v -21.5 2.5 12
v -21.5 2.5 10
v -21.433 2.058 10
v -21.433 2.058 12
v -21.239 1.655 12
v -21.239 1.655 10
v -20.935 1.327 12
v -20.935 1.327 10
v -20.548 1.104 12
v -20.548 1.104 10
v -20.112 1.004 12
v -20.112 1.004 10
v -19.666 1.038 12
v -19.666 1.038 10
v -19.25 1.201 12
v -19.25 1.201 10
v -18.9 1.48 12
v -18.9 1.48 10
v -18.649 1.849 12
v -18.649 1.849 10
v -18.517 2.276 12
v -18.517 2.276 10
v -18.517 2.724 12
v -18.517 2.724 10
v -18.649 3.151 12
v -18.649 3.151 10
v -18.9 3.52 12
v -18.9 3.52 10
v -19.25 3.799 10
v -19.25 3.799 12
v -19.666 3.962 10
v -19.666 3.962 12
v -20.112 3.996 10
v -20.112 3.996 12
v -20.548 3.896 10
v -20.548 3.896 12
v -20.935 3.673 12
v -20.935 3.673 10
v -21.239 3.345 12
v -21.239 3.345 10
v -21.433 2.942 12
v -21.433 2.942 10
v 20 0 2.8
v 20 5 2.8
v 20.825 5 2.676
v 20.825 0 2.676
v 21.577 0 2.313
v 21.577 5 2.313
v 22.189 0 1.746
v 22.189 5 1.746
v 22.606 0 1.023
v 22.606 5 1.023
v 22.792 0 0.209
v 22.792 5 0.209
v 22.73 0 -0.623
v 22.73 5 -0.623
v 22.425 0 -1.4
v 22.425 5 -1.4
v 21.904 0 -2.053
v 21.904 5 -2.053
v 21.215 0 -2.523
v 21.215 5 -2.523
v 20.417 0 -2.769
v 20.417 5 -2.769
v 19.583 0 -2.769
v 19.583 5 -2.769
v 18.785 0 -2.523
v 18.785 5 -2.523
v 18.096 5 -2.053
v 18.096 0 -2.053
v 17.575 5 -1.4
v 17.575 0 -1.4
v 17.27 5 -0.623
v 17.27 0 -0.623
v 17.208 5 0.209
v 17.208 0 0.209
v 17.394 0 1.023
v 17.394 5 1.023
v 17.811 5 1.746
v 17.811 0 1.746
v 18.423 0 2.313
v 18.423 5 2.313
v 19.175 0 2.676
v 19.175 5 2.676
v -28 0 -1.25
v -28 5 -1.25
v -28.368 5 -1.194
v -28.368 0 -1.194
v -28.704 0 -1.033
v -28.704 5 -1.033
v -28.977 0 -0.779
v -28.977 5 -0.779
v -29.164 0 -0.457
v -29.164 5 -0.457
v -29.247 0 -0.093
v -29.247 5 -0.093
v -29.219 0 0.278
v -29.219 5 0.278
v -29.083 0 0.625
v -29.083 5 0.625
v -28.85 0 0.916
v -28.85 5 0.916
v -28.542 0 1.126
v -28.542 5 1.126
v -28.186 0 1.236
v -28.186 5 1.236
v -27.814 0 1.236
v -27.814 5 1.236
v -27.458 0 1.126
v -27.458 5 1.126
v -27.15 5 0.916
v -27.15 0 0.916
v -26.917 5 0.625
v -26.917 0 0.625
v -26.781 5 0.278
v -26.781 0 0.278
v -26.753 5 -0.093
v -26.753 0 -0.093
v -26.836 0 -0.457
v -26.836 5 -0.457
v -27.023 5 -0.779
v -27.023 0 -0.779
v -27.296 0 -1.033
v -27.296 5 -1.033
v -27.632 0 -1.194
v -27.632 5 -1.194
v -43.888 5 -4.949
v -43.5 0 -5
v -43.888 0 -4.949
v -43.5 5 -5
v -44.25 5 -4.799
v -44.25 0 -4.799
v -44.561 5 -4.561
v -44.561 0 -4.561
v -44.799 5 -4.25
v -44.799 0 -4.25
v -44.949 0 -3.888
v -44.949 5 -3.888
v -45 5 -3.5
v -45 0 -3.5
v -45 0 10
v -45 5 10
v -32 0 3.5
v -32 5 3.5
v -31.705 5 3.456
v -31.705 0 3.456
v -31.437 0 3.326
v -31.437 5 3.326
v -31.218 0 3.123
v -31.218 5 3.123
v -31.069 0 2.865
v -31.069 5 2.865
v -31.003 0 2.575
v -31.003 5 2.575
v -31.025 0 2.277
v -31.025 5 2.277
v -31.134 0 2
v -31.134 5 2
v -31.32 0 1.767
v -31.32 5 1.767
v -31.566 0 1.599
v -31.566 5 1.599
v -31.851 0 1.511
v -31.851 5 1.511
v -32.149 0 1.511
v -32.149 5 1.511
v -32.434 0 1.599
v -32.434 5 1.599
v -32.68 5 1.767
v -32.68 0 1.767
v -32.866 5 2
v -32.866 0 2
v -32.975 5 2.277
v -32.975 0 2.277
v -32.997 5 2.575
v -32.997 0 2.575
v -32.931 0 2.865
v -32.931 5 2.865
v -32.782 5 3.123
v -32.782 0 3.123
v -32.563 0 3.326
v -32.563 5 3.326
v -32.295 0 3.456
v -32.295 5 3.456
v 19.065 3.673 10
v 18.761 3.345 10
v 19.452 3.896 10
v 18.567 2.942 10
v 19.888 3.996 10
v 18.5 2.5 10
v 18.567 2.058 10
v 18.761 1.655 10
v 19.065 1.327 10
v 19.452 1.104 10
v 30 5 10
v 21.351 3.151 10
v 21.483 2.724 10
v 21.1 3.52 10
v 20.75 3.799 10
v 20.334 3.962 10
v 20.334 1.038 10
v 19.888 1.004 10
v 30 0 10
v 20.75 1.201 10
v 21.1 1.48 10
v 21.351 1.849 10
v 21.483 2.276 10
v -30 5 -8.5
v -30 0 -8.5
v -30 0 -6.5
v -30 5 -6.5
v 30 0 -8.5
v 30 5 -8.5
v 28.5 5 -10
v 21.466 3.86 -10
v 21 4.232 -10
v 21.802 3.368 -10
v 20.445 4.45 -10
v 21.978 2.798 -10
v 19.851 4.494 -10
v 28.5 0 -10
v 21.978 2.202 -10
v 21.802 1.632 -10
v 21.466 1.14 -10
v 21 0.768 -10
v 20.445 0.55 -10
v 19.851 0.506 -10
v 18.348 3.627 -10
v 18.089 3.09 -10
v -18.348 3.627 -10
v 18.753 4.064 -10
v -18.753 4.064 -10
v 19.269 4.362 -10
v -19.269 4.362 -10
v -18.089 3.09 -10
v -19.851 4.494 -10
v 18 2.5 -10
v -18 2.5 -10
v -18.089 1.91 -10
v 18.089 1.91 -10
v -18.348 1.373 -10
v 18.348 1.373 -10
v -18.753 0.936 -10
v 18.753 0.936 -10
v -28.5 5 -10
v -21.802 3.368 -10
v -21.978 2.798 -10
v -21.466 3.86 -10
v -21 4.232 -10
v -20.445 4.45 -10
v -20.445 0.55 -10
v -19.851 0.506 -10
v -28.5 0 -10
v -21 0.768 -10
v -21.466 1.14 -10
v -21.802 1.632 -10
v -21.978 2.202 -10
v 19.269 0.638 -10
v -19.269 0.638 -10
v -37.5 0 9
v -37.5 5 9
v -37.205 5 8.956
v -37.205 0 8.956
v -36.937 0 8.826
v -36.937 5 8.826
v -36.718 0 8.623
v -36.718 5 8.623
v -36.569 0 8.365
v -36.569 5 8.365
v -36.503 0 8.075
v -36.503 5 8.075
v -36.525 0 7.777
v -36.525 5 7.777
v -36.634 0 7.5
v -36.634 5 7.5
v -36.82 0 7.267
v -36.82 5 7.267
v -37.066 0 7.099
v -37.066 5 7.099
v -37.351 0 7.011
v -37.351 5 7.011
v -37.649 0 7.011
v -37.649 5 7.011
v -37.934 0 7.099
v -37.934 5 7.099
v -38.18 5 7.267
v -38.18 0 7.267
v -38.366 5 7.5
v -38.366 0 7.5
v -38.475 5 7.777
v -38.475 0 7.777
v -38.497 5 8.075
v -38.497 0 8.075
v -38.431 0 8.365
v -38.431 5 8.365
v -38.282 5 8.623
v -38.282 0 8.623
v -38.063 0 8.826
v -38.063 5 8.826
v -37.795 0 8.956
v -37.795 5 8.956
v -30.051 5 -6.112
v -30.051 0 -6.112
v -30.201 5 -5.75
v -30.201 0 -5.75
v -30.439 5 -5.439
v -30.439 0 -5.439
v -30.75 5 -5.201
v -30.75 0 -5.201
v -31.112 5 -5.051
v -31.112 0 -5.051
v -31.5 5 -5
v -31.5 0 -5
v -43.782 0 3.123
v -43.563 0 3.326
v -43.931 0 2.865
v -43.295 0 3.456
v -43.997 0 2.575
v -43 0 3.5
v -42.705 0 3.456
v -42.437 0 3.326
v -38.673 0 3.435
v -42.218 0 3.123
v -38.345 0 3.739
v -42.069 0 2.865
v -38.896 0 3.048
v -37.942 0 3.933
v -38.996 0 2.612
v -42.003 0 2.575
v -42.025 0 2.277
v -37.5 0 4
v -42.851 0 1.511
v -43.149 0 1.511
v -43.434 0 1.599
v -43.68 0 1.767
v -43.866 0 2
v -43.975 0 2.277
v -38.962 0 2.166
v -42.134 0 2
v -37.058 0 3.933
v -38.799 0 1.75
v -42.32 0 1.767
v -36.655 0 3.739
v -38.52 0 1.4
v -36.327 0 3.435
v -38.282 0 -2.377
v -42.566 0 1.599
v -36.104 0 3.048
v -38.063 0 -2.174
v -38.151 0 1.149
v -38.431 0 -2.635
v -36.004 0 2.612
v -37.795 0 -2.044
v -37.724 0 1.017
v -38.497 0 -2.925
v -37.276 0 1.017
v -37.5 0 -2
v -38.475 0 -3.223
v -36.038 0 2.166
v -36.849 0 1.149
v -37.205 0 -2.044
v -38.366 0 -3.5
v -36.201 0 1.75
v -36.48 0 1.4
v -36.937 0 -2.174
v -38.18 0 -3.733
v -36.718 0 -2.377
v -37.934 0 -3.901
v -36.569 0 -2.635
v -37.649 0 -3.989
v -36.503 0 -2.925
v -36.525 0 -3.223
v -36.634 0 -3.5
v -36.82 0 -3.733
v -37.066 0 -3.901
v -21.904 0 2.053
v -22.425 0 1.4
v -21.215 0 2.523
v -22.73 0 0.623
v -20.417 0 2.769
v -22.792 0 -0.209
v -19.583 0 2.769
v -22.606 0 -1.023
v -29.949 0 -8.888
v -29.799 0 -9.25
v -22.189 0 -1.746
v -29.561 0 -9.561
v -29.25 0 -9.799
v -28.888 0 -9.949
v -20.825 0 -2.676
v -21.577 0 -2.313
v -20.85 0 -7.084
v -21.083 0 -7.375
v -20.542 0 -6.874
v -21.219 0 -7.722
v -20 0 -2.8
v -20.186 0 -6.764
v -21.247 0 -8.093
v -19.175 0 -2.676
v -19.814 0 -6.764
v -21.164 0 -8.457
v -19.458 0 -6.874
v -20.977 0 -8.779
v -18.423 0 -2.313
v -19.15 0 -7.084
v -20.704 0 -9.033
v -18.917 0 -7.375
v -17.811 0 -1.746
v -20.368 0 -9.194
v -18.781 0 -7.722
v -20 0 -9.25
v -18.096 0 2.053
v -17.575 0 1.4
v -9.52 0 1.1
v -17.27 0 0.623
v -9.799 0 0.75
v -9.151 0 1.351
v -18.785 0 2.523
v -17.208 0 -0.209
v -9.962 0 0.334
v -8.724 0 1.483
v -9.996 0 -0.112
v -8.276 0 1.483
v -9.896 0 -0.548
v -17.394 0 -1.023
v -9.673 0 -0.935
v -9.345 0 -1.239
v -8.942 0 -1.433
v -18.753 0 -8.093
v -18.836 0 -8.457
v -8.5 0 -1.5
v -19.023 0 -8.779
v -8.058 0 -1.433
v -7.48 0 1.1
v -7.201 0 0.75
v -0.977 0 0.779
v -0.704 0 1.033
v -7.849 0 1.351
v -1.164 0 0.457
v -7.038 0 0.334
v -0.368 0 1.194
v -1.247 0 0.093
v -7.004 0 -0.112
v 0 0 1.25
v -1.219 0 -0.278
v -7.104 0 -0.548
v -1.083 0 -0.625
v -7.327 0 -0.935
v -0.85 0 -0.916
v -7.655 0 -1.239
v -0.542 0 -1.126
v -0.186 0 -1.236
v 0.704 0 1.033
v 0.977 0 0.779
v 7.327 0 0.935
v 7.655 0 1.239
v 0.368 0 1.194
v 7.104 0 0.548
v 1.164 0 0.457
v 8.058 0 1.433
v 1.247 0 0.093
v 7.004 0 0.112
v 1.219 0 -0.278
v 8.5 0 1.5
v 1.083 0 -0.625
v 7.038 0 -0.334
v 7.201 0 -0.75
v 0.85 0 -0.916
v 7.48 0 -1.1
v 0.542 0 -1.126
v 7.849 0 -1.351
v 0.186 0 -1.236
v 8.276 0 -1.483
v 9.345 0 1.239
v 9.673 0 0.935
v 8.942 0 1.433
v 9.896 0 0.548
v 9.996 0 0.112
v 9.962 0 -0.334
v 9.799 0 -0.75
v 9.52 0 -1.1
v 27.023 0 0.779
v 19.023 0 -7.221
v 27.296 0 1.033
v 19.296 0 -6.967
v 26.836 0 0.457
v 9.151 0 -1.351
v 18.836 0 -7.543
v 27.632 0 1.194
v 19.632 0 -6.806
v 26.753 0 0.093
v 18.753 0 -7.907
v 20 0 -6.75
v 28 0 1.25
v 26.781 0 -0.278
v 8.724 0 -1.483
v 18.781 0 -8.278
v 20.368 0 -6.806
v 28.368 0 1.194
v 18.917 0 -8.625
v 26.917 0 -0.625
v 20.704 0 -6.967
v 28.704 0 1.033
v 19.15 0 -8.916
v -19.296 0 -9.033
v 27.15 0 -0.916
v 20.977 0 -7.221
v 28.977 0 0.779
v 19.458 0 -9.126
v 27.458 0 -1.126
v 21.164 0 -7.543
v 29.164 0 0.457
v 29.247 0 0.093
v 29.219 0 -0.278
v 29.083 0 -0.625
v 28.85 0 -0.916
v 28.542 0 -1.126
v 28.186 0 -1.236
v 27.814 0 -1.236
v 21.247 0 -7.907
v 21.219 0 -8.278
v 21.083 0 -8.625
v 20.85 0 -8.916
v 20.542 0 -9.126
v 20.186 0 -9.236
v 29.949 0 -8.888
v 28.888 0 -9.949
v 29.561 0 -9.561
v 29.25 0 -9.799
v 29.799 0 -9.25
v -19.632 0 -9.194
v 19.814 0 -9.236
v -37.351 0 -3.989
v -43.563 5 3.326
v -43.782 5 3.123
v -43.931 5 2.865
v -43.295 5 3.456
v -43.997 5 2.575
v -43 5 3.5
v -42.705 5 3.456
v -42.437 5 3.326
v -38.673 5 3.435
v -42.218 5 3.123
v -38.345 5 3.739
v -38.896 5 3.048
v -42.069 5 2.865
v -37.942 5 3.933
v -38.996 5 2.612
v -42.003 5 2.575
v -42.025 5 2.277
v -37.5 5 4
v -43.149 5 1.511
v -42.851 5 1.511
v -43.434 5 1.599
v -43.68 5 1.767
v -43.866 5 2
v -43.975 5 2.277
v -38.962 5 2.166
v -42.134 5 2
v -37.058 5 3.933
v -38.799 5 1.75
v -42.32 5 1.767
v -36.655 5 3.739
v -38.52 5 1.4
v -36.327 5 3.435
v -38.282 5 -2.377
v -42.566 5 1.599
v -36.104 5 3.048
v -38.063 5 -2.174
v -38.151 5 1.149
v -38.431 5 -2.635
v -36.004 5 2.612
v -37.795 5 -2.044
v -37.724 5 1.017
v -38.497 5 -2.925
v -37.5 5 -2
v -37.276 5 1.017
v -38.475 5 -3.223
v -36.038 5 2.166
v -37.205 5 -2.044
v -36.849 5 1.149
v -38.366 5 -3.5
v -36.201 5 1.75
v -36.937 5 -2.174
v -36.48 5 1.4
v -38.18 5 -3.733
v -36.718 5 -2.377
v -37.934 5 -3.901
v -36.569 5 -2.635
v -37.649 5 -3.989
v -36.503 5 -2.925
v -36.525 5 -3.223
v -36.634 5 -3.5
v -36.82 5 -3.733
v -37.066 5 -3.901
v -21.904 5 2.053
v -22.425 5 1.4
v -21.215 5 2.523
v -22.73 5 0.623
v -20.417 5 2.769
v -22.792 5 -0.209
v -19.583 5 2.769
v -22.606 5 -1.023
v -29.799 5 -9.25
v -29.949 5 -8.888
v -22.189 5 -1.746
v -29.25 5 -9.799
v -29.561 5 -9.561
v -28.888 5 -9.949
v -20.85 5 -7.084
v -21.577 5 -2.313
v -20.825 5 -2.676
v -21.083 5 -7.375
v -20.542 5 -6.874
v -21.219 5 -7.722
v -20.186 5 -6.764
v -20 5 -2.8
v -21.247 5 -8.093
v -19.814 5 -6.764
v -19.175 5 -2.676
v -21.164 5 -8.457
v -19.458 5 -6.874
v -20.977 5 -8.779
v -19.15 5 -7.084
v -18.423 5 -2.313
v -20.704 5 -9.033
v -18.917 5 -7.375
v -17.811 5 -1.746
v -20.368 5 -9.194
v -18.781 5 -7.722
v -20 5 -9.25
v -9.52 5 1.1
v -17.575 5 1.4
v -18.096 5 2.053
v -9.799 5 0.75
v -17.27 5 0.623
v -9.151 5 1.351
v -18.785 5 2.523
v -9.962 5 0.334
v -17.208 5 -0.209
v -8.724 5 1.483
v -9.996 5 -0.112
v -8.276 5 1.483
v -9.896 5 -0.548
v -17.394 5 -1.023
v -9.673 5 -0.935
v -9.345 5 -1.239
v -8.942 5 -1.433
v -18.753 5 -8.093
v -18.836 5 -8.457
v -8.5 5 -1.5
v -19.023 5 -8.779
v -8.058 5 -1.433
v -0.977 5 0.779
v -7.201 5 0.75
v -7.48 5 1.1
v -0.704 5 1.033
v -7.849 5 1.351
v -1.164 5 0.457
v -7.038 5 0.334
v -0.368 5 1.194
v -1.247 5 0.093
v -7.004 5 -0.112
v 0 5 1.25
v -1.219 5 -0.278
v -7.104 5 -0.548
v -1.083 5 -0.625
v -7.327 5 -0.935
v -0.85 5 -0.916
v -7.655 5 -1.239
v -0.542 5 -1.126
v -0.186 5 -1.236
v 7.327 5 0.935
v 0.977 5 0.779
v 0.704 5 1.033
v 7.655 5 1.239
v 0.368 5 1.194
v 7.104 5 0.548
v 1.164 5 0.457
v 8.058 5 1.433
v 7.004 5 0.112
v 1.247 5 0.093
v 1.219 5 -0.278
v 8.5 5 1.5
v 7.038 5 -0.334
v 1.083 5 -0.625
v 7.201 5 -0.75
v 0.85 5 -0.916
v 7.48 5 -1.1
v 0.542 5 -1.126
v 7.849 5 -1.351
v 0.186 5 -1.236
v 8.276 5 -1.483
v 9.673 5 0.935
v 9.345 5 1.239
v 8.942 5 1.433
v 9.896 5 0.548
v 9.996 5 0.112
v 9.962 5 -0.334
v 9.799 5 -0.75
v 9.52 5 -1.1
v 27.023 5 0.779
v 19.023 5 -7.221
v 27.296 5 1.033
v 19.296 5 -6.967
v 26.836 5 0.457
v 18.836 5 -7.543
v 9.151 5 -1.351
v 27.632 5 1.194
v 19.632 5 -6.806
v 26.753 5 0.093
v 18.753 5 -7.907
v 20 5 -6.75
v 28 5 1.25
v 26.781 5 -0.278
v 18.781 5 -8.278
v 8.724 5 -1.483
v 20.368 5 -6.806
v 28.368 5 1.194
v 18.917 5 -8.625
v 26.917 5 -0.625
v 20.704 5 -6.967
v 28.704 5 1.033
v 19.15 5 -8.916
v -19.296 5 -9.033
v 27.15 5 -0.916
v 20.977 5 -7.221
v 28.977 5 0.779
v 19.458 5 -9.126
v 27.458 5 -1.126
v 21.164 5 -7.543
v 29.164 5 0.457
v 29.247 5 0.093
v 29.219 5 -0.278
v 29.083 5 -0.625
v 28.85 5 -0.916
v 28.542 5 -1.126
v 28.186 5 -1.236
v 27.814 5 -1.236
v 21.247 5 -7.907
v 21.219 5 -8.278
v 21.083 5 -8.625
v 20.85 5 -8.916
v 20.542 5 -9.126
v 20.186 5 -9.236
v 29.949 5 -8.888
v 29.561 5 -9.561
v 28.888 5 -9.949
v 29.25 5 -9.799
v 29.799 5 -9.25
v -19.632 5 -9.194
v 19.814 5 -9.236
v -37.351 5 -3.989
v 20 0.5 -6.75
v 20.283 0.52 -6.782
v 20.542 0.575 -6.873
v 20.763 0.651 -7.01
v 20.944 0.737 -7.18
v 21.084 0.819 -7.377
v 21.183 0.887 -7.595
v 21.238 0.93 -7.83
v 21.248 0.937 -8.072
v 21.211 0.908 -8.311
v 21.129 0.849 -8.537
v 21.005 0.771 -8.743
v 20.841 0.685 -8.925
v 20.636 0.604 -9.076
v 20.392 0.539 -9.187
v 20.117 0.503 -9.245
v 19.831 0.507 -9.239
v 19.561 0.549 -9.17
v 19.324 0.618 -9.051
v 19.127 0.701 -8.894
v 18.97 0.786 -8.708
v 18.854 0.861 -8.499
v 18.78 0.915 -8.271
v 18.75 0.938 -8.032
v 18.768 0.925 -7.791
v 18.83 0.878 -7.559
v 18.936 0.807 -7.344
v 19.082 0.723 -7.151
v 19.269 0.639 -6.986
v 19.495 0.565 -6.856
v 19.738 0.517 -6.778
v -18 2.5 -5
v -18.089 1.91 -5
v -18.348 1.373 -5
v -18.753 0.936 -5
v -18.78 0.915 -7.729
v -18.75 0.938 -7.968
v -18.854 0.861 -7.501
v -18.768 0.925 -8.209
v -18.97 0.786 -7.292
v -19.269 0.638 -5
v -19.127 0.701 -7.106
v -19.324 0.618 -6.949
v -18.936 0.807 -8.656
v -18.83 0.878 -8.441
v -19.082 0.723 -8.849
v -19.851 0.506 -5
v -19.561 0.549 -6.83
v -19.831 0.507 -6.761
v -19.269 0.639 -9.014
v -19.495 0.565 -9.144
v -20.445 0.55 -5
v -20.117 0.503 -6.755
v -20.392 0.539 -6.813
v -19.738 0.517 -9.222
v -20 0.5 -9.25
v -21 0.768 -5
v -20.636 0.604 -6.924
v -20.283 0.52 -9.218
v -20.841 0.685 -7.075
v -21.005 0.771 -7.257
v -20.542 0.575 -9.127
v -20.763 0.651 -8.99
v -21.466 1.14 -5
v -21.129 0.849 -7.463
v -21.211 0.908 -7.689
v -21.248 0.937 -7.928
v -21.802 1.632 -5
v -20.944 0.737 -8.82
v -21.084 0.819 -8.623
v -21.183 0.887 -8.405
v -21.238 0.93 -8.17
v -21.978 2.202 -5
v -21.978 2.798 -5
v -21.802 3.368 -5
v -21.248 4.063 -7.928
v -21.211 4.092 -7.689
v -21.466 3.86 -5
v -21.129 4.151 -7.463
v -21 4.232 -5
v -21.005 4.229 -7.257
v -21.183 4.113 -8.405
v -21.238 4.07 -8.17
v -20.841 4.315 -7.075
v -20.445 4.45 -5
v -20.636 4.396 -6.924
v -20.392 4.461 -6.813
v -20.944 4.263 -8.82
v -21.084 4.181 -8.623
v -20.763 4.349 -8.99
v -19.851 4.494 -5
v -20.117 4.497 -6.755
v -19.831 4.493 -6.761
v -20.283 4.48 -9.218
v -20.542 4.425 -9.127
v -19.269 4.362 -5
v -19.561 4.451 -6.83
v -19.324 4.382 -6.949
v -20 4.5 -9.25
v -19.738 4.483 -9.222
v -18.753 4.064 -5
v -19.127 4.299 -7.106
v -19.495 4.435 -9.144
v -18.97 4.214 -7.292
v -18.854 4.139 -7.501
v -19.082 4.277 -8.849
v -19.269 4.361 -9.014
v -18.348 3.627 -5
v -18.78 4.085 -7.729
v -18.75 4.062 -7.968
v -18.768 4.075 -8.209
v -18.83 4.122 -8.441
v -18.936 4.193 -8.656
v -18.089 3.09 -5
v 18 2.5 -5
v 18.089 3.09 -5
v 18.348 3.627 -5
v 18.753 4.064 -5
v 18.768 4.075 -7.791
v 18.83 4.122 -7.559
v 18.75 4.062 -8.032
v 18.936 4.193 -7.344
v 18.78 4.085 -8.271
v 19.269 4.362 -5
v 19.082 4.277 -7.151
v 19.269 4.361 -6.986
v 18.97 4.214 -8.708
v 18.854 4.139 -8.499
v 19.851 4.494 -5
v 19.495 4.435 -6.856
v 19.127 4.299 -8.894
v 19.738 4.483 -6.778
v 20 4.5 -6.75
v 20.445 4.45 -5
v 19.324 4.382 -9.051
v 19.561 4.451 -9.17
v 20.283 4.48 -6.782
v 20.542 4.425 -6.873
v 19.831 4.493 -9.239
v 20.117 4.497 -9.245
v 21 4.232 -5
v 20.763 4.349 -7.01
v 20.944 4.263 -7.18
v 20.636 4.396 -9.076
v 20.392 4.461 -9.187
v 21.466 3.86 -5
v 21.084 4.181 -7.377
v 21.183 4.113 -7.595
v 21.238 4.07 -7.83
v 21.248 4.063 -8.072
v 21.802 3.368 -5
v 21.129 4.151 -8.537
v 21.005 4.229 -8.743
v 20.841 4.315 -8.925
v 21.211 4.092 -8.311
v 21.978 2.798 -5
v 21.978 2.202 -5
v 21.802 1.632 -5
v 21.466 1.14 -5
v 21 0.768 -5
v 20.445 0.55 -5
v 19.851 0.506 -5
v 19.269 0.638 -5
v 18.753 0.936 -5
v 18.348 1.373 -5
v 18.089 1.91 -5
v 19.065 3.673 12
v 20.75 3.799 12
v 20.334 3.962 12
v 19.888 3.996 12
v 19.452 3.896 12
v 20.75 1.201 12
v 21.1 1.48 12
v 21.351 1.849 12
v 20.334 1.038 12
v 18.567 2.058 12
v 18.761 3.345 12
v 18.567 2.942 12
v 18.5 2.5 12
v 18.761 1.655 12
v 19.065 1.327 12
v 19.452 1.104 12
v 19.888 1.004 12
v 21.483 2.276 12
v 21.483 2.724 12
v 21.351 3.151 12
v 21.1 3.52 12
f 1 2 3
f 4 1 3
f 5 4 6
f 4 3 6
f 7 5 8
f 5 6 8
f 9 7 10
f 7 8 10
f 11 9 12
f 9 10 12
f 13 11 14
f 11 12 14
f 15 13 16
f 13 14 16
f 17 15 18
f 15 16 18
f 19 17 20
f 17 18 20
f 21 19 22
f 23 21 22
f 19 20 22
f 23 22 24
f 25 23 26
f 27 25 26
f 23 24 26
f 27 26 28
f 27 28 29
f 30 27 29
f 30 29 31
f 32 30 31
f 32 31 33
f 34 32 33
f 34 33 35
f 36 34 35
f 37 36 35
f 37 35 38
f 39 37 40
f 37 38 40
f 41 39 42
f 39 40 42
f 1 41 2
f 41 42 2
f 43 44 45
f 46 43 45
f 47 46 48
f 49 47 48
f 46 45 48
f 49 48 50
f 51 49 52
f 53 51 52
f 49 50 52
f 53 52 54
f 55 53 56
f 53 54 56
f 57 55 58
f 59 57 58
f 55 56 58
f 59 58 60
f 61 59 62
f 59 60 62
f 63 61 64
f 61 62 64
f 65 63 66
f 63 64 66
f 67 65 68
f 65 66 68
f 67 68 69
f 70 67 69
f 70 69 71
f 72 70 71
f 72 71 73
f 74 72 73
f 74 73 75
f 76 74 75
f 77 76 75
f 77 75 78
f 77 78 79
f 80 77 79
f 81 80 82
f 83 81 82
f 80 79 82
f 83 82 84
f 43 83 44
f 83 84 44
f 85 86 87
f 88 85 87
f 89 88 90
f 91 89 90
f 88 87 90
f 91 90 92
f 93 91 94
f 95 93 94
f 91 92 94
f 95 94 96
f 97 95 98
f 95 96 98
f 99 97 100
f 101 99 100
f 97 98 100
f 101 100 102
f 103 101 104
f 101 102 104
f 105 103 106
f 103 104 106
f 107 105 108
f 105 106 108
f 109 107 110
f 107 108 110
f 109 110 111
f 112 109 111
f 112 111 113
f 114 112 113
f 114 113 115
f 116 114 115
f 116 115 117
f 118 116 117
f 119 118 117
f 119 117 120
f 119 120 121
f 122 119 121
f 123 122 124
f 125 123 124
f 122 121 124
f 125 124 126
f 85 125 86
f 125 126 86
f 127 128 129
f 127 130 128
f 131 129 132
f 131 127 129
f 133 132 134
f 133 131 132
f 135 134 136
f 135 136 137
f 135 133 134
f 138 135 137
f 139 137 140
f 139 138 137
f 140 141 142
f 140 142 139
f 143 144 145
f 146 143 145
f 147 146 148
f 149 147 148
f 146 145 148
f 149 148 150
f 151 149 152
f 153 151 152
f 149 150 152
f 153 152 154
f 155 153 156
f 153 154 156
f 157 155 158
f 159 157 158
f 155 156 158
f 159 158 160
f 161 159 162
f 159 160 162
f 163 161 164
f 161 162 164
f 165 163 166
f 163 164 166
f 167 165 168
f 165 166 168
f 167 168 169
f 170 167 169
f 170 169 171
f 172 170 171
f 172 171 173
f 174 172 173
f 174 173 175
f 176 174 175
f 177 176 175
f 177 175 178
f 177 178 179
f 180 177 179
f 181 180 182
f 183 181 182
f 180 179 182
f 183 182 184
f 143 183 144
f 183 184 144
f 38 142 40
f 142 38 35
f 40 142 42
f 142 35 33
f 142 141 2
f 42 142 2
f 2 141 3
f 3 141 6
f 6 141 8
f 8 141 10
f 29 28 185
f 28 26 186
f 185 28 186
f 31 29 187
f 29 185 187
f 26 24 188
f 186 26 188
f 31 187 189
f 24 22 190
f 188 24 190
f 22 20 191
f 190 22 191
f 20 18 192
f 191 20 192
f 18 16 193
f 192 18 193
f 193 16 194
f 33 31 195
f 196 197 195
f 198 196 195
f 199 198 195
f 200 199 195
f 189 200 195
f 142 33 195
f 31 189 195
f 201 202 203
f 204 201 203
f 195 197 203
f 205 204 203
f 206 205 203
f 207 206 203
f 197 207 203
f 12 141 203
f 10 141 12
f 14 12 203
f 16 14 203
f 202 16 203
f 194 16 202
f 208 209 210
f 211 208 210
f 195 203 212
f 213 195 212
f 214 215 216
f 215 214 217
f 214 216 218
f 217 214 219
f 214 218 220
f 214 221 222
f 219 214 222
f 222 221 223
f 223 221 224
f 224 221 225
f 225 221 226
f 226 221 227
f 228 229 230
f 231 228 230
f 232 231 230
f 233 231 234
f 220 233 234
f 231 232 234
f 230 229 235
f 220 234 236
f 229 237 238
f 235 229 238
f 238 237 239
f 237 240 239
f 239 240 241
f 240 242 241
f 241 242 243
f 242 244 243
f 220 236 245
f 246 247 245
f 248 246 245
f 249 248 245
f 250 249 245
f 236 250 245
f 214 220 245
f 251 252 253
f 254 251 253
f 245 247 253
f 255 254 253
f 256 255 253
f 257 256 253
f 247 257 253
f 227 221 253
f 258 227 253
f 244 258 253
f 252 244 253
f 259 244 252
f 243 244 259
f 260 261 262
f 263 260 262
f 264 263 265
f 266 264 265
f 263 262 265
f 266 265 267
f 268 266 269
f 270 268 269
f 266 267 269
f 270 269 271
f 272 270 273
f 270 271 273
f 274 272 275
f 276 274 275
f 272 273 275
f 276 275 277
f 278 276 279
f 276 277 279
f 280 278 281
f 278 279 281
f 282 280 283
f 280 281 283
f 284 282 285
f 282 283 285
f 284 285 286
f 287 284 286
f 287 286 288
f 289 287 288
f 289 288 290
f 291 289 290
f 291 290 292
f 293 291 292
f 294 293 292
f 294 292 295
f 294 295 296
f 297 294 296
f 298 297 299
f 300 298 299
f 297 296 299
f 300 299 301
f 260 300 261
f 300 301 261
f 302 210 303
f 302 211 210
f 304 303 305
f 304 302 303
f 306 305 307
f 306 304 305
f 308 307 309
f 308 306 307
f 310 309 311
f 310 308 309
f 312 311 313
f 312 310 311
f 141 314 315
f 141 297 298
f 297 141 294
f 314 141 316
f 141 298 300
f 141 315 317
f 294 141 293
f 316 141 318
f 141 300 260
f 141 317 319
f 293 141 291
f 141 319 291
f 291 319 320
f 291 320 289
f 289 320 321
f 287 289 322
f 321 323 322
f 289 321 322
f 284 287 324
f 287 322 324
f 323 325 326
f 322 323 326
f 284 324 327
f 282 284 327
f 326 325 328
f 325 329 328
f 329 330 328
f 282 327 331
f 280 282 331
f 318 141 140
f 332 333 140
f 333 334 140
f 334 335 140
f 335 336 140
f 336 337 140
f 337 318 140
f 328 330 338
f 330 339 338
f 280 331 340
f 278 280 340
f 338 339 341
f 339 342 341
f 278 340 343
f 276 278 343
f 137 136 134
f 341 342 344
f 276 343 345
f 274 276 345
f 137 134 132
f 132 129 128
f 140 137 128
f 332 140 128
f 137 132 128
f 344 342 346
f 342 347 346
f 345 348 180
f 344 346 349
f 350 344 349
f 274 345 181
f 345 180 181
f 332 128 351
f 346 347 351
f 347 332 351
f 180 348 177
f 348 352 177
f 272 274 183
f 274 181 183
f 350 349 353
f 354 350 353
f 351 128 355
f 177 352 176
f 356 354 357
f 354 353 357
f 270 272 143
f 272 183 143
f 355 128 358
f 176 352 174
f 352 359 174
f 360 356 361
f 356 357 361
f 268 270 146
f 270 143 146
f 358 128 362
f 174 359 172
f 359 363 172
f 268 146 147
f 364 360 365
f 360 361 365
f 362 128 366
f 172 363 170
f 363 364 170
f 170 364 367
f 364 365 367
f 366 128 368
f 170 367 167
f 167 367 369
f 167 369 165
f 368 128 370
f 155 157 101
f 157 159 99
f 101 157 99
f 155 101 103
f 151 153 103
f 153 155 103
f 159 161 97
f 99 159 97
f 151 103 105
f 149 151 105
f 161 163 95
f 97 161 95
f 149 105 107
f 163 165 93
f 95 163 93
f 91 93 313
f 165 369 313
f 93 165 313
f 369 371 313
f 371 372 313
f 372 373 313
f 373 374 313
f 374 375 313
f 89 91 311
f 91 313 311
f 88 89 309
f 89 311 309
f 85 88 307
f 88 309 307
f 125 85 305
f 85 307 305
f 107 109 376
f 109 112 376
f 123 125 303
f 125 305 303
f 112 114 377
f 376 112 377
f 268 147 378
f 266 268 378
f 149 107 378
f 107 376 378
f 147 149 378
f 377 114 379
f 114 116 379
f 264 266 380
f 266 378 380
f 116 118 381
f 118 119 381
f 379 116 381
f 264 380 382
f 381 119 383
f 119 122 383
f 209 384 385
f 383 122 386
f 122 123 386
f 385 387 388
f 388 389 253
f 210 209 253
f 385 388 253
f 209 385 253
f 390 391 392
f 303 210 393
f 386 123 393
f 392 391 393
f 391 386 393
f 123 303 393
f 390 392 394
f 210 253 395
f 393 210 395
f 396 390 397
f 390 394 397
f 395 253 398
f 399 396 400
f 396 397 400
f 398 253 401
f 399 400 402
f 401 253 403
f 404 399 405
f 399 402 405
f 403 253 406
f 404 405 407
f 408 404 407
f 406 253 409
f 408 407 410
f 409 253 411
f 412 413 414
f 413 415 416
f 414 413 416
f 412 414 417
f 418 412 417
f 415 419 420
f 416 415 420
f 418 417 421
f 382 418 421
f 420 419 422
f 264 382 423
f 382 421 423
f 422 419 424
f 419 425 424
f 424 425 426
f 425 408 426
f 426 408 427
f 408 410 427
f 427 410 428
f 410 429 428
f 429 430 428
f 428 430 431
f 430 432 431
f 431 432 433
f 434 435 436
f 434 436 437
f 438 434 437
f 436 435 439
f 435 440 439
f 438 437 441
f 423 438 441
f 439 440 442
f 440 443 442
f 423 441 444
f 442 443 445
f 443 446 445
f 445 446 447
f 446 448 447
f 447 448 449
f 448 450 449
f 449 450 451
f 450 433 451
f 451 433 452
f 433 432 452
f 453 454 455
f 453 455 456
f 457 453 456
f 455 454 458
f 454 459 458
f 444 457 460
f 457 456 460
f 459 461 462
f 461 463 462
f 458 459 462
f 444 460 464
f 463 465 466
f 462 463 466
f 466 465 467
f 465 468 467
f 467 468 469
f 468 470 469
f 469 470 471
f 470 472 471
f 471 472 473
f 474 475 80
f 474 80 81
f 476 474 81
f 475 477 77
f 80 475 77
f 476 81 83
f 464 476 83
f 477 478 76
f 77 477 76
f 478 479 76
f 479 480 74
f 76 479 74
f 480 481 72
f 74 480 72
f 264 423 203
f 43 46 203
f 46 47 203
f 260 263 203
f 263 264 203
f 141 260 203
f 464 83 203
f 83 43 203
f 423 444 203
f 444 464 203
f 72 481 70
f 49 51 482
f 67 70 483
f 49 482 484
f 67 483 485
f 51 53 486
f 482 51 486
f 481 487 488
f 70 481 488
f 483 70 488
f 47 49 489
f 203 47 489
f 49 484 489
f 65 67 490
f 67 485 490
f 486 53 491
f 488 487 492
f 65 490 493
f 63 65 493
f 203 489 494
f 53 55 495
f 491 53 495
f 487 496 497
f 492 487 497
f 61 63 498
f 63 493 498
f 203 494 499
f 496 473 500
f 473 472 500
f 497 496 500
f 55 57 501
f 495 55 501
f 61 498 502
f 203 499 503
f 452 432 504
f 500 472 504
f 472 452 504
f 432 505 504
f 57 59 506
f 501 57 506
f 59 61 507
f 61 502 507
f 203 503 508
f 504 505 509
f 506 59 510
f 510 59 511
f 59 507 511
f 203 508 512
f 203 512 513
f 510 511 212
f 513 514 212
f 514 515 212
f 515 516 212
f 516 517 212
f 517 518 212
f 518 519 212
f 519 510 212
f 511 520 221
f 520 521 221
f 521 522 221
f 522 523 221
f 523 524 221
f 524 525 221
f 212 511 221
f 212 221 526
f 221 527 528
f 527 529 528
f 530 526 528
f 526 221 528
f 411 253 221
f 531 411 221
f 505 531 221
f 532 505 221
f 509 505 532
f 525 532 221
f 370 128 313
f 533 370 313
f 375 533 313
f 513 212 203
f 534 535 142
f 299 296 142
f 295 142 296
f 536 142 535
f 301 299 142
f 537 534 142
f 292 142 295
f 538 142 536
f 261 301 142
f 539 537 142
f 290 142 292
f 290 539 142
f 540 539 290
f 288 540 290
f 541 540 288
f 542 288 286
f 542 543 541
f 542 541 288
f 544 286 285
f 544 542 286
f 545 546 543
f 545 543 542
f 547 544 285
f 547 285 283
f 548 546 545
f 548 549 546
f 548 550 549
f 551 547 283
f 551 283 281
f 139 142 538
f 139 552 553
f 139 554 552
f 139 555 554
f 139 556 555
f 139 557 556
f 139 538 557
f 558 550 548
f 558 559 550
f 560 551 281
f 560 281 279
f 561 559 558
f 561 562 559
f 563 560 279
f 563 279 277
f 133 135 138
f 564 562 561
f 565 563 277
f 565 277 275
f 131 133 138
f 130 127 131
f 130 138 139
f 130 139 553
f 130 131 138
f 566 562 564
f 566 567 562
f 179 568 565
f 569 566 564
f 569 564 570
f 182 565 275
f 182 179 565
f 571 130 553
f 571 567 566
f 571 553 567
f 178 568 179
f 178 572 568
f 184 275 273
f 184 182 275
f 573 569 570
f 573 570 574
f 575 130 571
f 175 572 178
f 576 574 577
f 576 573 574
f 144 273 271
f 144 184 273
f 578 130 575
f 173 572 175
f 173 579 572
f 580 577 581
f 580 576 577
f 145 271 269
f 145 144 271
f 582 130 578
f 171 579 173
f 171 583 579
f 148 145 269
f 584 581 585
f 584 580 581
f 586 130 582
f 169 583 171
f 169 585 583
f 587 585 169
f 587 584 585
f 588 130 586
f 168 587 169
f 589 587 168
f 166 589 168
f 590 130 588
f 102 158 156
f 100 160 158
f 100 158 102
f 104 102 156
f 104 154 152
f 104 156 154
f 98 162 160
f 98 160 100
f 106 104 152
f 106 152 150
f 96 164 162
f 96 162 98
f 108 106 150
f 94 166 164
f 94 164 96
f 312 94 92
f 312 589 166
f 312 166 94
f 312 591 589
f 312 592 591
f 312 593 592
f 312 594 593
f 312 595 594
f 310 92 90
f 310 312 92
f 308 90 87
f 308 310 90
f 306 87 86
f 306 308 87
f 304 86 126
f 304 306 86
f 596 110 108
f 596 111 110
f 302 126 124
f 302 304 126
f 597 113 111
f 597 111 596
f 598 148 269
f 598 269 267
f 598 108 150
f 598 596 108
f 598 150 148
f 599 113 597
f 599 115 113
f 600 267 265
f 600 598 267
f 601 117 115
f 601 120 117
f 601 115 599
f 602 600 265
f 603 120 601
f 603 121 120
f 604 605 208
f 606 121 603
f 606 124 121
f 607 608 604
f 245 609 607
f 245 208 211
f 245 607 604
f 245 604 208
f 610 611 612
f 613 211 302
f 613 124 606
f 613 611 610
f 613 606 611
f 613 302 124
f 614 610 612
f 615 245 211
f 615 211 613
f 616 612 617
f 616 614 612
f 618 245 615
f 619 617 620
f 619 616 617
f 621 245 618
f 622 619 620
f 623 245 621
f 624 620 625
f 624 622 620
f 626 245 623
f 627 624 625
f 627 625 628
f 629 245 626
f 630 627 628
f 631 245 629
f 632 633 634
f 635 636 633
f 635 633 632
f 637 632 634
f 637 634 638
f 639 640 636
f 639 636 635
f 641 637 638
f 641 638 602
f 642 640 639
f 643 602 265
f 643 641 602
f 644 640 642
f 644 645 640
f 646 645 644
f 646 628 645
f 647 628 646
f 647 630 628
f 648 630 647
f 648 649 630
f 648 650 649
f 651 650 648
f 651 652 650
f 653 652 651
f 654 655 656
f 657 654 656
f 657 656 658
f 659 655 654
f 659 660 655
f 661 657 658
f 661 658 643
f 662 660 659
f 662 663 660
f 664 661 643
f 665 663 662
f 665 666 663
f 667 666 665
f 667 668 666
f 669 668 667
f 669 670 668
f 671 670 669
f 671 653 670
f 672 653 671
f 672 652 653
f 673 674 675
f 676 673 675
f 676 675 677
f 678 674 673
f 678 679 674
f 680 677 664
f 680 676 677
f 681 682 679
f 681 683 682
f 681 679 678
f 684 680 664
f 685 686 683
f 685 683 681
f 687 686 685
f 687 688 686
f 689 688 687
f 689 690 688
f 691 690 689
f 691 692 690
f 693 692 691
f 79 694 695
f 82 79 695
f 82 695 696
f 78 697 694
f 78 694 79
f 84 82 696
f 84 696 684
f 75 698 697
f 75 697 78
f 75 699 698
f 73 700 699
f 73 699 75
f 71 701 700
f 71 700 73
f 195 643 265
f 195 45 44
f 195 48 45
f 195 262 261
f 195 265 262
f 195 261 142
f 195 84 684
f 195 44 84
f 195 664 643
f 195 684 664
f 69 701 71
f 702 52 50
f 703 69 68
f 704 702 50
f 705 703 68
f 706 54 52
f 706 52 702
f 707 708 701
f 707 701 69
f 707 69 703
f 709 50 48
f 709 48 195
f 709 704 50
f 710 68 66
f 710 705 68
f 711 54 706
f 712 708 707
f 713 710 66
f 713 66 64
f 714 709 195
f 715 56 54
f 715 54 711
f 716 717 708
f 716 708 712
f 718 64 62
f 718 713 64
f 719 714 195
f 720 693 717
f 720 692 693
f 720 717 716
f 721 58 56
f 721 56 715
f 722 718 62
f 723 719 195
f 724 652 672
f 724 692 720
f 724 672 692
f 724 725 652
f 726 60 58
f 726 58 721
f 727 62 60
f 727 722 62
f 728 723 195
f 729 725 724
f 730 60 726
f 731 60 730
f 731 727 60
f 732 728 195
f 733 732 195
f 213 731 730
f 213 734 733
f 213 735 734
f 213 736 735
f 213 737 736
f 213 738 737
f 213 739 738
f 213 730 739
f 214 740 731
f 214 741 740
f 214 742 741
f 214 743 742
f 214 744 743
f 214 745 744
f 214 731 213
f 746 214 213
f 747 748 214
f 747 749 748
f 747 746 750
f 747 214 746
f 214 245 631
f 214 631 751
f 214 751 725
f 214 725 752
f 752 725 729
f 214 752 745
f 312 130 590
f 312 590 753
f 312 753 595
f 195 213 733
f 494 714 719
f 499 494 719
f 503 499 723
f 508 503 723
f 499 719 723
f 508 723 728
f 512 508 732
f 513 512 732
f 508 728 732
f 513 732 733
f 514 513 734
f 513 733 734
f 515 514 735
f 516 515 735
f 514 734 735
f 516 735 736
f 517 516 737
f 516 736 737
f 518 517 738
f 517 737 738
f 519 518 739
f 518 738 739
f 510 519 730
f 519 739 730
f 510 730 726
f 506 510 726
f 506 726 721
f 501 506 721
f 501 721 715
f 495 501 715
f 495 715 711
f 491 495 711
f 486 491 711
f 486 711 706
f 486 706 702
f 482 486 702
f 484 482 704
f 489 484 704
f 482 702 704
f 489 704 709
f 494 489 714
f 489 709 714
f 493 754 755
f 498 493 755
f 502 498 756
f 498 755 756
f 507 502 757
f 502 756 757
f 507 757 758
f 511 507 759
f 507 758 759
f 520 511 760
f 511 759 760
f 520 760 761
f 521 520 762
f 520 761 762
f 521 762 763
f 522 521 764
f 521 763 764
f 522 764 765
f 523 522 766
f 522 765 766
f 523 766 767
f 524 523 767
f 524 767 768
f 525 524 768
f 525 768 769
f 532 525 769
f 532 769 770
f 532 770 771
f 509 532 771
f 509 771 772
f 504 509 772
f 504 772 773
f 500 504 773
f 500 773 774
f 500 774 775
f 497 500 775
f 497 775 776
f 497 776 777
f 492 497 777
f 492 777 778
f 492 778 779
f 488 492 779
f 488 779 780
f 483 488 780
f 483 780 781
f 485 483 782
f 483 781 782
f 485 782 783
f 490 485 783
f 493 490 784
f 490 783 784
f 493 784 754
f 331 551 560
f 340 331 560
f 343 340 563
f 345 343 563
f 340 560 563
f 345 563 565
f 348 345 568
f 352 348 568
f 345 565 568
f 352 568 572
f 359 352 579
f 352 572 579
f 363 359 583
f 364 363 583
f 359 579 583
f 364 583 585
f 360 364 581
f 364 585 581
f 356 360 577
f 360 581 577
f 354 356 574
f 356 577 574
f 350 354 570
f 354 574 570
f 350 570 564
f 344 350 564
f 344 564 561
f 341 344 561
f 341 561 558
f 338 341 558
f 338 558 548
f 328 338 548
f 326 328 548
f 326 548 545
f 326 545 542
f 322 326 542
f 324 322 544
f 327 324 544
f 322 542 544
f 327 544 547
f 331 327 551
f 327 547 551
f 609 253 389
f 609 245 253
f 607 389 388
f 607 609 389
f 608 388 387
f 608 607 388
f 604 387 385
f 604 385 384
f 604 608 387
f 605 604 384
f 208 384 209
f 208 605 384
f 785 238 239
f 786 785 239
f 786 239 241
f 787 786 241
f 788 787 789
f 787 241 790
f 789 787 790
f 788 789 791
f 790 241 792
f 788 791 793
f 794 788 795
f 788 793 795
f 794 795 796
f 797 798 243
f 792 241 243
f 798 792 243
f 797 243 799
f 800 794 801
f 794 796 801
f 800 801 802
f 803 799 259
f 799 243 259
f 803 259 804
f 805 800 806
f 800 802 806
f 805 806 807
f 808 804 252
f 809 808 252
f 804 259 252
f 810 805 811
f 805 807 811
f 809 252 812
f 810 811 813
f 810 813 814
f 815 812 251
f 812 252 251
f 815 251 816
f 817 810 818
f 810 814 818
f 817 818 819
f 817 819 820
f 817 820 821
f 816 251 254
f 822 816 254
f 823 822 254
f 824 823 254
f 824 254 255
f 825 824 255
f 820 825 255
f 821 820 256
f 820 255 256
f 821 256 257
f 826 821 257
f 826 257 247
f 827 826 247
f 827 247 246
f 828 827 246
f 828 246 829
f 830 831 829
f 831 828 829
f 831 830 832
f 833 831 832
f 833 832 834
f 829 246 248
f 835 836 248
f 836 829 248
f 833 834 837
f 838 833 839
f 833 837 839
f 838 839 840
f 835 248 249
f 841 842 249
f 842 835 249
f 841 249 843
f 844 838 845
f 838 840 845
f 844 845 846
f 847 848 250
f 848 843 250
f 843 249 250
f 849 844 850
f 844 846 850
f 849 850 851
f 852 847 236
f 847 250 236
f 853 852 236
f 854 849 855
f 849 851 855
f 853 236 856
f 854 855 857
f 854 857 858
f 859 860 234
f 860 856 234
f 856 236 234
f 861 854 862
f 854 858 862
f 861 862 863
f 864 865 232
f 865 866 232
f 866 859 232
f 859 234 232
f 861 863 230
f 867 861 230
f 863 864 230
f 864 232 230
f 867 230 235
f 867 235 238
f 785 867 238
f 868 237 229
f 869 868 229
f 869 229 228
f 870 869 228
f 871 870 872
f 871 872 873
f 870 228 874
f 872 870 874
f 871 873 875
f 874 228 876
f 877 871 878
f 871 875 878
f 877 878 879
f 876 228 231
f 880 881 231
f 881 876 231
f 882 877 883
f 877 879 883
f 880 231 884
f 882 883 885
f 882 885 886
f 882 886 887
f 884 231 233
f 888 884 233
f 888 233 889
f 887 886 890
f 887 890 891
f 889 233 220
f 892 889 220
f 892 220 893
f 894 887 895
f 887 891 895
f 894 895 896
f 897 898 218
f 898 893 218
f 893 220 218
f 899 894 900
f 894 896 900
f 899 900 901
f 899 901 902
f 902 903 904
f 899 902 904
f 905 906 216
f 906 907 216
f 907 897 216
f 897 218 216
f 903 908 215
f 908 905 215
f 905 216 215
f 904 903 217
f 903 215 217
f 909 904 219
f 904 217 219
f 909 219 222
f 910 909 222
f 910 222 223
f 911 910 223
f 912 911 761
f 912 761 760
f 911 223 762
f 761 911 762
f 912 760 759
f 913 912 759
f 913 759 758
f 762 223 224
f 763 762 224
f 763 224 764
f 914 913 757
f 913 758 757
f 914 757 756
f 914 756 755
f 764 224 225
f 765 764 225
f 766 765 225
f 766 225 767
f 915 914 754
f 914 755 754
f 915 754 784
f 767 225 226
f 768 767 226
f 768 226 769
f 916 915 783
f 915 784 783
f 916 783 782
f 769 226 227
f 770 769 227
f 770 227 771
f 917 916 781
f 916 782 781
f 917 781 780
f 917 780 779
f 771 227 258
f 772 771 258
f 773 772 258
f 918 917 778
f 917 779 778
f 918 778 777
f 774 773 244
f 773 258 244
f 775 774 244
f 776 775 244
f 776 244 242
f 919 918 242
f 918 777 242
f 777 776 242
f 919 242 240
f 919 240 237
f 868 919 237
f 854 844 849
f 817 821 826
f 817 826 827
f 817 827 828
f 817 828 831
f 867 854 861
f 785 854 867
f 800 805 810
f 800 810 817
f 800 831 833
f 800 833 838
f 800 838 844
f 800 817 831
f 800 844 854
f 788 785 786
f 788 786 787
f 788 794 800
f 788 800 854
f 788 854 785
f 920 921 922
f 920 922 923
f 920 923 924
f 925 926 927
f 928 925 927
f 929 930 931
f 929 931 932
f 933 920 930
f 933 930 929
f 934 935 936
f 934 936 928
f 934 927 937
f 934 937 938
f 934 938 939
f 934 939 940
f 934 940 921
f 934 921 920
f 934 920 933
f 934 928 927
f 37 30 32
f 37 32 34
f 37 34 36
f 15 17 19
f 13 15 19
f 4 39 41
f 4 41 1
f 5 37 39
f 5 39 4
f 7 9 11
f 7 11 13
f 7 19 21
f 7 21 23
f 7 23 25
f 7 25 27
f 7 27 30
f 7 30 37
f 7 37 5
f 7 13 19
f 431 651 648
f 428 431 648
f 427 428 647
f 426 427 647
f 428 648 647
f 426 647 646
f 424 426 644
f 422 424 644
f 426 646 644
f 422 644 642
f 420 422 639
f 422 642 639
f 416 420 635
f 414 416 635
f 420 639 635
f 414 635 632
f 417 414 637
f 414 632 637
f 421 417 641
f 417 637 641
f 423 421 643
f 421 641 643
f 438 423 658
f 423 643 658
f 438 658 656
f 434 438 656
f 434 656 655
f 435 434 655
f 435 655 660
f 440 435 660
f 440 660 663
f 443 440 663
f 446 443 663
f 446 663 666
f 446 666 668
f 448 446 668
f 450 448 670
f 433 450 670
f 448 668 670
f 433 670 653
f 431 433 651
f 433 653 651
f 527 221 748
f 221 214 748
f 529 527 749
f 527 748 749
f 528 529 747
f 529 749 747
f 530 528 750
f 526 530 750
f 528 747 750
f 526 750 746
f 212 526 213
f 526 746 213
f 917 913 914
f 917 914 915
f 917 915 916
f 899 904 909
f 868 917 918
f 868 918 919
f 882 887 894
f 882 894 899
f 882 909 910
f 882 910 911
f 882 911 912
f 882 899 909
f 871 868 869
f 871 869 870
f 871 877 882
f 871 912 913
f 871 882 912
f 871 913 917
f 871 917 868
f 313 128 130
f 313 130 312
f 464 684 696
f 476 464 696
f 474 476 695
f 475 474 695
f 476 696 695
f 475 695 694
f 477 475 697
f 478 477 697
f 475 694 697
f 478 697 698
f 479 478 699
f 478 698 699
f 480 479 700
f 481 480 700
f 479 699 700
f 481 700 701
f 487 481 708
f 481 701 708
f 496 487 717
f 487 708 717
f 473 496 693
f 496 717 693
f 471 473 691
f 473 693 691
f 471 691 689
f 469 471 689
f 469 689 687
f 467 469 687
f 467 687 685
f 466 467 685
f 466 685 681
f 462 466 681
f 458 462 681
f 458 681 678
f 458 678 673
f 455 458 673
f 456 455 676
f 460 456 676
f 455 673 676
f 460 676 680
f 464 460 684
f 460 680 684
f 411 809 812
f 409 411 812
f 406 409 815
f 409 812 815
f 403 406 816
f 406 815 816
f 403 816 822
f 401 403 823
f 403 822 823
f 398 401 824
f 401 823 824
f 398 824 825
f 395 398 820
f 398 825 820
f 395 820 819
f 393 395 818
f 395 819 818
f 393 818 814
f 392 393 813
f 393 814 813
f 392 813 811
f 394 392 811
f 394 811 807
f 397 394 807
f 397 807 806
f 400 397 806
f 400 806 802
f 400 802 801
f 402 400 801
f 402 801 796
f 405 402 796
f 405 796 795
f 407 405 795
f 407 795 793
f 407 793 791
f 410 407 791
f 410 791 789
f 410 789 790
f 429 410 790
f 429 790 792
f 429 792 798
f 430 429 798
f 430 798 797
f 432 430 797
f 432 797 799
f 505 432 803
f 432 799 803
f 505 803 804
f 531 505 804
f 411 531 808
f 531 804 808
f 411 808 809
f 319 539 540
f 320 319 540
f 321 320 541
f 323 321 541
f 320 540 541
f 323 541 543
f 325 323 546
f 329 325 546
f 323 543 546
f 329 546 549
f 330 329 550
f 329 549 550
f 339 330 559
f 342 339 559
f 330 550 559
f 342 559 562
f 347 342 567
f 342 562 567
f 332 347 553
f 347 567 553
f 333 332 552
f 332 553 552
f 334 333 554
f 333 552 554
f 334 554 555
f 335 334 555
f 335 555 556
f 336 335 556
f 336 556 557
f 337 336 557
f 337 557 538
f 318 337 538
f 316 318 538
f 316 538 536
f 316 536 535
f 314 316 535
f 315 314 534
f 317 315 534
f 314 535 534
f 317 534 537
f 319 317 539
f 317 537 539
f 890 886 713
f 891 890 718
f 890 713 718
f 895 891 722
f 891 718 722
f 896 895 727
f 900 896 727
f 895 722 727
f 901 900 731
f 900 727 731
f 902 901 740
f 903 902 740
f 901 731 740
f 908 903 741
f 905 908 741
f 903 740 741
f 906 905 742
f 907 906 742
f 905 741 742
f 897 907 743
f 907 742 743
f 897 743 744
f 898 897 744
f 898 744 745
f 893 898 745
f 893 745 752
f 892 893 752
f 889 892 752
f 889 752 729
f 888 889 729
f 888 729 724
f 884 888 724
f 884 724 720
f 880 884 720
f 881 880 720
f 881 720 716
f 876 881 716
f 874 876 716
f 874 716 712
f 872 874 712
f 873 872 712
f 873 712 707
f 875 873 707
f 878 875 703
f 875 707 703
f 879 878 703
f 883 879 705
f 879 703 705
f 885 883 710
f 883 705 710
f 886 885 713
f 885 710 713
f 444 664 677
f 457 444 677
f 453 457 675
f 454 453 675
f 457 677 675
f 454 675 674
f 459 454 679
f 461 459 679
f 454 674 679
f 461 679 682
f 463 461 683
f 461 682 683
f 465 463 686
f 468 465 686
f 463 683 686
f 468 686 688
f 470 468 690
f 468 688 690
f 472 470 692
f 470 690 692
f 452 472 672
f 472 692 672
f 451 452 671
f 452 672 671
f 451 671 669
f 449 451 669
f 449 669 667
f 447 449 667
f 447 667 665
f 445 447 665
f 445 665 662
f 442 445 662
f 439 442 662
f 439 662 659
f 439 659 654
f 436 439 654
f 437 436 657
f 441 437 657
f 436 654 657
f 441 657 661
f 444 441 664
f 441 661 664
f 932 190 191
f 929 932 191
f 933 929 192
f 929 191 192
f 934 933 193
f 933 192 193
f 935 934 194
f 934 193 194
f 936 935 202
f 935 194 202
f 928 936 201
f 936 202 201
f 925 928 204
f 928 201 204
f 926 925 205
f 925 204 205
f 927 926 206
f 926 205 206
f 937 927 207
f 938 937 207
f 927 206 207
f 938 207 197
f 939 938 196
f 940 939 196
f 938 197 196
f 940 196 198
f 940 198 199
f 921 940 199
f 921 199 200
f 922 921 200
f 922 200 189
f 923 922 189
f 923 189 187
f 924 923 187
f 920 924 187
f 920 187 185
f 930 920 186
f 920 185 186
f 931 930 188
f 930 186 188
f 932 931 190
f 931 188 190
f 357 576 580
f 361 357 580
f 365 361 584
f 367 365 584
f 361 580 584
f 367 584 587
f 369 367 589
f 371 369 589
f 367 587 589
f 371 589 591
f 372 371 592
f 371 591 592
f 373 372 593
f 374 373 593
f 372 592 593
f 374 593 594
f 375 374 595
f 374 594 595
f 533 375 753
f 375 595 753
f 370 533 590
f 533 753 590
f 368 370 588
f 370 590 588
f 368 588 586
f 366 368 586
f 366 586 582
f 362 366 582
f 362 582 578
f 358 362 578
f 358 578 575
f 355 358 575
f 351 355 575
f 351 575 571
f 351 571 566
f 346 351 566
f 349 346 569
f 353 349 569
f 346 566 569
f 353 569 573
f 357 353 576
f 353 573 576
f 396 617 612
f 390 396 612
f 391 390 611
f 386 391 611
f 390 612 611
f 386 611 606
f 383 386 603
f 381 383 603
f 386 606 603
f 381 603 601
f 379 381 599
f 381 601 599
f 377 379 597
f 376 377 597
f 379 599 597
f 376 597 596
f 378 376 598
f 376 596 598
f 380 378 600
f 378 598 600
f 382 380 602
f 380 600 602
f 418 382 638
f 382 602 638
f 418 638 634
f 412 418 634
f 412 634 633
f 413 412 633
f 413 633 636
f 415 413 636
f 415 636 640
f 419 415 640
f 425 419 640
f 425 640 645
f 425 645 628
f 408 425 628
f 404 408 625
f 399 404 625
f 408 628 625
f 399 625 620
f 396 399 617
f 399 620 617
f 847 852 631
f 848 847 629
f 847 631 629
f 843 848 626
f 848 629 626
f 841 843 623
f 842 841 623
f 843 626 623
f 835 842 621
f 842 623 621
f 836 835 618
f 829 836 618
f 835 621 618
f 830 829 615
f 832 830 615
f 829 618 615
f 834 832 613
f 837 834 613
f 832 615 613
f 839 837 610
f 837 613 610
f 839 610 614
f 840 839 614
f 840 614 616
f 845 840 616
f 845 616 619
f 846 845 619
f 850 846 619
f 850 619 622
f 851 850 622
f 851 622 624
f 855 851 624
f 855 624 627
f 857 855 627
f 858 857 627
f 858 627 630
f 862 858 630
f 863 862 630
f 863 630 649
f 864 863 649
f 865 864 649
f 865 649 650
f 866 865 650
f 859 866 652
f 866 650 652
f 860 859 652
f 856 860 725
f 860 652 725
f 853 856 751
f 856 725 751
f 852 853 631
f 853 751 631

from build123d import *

# Parameters (mm, degrees)
SKETCH_1_W          = 15
SKETCH_1_H          = 15
EXTRUDE_1_DEPTH     = 5
SKETCH_2_R          = 1.5
SKETCH_2_R_2        = 1.25
SKETCH_2_R_3        = 2.8
SKETCH_2_R_4        = 1
CUT_EXTRUDE_1_DEPTH = 5
FILLET_1_R          = 1.5
SKETCH_4_R          = 1.5
EXTRUDE_2_DEPTH     = 2
SKETCH_5_R          = 2
CUT_EXTRUDE_2_DEPTH = 5


with BuildPart() as part:
    # 草图1 → 凸台-拉伸1 (new body)
    with BuildSketch(Plane(origin=(0, 0, 0), x_dir=(1, 0, 0), z_dir=(0, 1, 0))):
        Polygon((30, 10), (-30, 10), (-30, 5), (-30, -10), (30, -10), align=None)
        with Locations((-37.5, -2.5)):
            Rectangle(SKETCH_1_W, SKETCH_1_H)
    extrude(amount=EXTRUDE_1_DEPTH)

    # 草图2 → 切除-拉伸1 (cut)
    with BuildSketch(Plane(origin=(0, 5, 0), x_dir=(1, 0, 0), z_dir=(0, 1, 0))):
        with Locations(Location((8.5, 0, 0), (0, 0, 270))):
            Circle(SKETCH_2_R)
        with Locations(Location((-8.5, 0, 0), (0, 0, 90))):
            Circle(SKETCH_2_R)
        with Locations(Location((0, 0, 0), (0, 0, 270))):
            Circle(SKETCH_2_R_2)
        with Locations(Location((20, 0, 0), (0, 0, 270))):
            Circle(SKETCH_2_R_3)
        with Locations(Location((-20, 0, 0), (0, 0, 90))):
            Circle(SKETCH_2_R_3)
        with Locations(Location((20, 8, 0), (0, 0, 270))):
            Circle(SKETCH_2_R_2)
        with Locations(Location((28, 0, 0), (0, 0, 270))):
            Circle(SKETCH_2_R_2)
        with Locations(Location((-28, 0, 0), (0, 0, 90))):
            Circle(SKETCH_2_R_2)
        with Locations(Location((-20, 8, 0), (0, 0, 90))):
            Circle(SKETCH_2_R_2)
        with Locations(Location((-37.5, -2.5, 0), (0, 0, 270))):
            Circle(SKETCH_2_R)
        with Locations(Location((-32, -2.5, 0), (0, 0, 270))):
            Circle(SKETCH_2_R_4)
        with Locations(Location((-37.5, -8, 0), (0, 0, 270))):
            Circle(SKETCH_2_R_4)
        with Locations(Location((-43, -2.5, 0), (0, 0, 270))):
            Circle(SKETCH_2_R_4)
        with Locations(Location((-37.5, 3, 0), (0, 0, 270))):
            Circle(SKETCH_2_R_4)
    extrude(amount=-CUT_EXTRUDE_1_DEPTH, mode=Mode.SUBTRACT)

    # 圆角1
    fillet_1_edges = [part.edges().sort_by_distance(p)[0] for p in [
        (-30, 2.5, -5),
        (-45, 2.5, -5),
        (-30, 2.5, -10),
        (30, 2.5, -10),
    ]]
    fillet(fillet_1_edges, radius=FILLET_1_R)

    # 草图4 → 凸台-拉伸2 (add)
    with BuildSketch(Plane.XY.offset(10)):
        with Locations(Location((20, 2.5, 0), (0, 0, 180))):
            Circle(SKETCH_4_R)
        with Locations(Location((-20, 2.5, 0), (0, 0, 180))):
            Circle(SKETCH_4_R)
    extrude(amount=EXTRUDE_2_DEPTH)

    # 草图5 → 切除-拉伸2 (cut)
    with BuildSketch(Plane(origin=(0, 0, -10), x_dir=(-1, 0, 0), z_dir=(0, 0, -1))):
        with Locations((-20, 2.5)):
            Circle(SKETCH_5_R)
        with Locations(Location((20, 2.5, 0), (0, 0, 180))):
            Circle(SKETCH_5_R)
    extrude(amount=-CUT_EXTRUDE_2_DEPTH, mode=Mode.SUBTRACT)


solid = part.part
